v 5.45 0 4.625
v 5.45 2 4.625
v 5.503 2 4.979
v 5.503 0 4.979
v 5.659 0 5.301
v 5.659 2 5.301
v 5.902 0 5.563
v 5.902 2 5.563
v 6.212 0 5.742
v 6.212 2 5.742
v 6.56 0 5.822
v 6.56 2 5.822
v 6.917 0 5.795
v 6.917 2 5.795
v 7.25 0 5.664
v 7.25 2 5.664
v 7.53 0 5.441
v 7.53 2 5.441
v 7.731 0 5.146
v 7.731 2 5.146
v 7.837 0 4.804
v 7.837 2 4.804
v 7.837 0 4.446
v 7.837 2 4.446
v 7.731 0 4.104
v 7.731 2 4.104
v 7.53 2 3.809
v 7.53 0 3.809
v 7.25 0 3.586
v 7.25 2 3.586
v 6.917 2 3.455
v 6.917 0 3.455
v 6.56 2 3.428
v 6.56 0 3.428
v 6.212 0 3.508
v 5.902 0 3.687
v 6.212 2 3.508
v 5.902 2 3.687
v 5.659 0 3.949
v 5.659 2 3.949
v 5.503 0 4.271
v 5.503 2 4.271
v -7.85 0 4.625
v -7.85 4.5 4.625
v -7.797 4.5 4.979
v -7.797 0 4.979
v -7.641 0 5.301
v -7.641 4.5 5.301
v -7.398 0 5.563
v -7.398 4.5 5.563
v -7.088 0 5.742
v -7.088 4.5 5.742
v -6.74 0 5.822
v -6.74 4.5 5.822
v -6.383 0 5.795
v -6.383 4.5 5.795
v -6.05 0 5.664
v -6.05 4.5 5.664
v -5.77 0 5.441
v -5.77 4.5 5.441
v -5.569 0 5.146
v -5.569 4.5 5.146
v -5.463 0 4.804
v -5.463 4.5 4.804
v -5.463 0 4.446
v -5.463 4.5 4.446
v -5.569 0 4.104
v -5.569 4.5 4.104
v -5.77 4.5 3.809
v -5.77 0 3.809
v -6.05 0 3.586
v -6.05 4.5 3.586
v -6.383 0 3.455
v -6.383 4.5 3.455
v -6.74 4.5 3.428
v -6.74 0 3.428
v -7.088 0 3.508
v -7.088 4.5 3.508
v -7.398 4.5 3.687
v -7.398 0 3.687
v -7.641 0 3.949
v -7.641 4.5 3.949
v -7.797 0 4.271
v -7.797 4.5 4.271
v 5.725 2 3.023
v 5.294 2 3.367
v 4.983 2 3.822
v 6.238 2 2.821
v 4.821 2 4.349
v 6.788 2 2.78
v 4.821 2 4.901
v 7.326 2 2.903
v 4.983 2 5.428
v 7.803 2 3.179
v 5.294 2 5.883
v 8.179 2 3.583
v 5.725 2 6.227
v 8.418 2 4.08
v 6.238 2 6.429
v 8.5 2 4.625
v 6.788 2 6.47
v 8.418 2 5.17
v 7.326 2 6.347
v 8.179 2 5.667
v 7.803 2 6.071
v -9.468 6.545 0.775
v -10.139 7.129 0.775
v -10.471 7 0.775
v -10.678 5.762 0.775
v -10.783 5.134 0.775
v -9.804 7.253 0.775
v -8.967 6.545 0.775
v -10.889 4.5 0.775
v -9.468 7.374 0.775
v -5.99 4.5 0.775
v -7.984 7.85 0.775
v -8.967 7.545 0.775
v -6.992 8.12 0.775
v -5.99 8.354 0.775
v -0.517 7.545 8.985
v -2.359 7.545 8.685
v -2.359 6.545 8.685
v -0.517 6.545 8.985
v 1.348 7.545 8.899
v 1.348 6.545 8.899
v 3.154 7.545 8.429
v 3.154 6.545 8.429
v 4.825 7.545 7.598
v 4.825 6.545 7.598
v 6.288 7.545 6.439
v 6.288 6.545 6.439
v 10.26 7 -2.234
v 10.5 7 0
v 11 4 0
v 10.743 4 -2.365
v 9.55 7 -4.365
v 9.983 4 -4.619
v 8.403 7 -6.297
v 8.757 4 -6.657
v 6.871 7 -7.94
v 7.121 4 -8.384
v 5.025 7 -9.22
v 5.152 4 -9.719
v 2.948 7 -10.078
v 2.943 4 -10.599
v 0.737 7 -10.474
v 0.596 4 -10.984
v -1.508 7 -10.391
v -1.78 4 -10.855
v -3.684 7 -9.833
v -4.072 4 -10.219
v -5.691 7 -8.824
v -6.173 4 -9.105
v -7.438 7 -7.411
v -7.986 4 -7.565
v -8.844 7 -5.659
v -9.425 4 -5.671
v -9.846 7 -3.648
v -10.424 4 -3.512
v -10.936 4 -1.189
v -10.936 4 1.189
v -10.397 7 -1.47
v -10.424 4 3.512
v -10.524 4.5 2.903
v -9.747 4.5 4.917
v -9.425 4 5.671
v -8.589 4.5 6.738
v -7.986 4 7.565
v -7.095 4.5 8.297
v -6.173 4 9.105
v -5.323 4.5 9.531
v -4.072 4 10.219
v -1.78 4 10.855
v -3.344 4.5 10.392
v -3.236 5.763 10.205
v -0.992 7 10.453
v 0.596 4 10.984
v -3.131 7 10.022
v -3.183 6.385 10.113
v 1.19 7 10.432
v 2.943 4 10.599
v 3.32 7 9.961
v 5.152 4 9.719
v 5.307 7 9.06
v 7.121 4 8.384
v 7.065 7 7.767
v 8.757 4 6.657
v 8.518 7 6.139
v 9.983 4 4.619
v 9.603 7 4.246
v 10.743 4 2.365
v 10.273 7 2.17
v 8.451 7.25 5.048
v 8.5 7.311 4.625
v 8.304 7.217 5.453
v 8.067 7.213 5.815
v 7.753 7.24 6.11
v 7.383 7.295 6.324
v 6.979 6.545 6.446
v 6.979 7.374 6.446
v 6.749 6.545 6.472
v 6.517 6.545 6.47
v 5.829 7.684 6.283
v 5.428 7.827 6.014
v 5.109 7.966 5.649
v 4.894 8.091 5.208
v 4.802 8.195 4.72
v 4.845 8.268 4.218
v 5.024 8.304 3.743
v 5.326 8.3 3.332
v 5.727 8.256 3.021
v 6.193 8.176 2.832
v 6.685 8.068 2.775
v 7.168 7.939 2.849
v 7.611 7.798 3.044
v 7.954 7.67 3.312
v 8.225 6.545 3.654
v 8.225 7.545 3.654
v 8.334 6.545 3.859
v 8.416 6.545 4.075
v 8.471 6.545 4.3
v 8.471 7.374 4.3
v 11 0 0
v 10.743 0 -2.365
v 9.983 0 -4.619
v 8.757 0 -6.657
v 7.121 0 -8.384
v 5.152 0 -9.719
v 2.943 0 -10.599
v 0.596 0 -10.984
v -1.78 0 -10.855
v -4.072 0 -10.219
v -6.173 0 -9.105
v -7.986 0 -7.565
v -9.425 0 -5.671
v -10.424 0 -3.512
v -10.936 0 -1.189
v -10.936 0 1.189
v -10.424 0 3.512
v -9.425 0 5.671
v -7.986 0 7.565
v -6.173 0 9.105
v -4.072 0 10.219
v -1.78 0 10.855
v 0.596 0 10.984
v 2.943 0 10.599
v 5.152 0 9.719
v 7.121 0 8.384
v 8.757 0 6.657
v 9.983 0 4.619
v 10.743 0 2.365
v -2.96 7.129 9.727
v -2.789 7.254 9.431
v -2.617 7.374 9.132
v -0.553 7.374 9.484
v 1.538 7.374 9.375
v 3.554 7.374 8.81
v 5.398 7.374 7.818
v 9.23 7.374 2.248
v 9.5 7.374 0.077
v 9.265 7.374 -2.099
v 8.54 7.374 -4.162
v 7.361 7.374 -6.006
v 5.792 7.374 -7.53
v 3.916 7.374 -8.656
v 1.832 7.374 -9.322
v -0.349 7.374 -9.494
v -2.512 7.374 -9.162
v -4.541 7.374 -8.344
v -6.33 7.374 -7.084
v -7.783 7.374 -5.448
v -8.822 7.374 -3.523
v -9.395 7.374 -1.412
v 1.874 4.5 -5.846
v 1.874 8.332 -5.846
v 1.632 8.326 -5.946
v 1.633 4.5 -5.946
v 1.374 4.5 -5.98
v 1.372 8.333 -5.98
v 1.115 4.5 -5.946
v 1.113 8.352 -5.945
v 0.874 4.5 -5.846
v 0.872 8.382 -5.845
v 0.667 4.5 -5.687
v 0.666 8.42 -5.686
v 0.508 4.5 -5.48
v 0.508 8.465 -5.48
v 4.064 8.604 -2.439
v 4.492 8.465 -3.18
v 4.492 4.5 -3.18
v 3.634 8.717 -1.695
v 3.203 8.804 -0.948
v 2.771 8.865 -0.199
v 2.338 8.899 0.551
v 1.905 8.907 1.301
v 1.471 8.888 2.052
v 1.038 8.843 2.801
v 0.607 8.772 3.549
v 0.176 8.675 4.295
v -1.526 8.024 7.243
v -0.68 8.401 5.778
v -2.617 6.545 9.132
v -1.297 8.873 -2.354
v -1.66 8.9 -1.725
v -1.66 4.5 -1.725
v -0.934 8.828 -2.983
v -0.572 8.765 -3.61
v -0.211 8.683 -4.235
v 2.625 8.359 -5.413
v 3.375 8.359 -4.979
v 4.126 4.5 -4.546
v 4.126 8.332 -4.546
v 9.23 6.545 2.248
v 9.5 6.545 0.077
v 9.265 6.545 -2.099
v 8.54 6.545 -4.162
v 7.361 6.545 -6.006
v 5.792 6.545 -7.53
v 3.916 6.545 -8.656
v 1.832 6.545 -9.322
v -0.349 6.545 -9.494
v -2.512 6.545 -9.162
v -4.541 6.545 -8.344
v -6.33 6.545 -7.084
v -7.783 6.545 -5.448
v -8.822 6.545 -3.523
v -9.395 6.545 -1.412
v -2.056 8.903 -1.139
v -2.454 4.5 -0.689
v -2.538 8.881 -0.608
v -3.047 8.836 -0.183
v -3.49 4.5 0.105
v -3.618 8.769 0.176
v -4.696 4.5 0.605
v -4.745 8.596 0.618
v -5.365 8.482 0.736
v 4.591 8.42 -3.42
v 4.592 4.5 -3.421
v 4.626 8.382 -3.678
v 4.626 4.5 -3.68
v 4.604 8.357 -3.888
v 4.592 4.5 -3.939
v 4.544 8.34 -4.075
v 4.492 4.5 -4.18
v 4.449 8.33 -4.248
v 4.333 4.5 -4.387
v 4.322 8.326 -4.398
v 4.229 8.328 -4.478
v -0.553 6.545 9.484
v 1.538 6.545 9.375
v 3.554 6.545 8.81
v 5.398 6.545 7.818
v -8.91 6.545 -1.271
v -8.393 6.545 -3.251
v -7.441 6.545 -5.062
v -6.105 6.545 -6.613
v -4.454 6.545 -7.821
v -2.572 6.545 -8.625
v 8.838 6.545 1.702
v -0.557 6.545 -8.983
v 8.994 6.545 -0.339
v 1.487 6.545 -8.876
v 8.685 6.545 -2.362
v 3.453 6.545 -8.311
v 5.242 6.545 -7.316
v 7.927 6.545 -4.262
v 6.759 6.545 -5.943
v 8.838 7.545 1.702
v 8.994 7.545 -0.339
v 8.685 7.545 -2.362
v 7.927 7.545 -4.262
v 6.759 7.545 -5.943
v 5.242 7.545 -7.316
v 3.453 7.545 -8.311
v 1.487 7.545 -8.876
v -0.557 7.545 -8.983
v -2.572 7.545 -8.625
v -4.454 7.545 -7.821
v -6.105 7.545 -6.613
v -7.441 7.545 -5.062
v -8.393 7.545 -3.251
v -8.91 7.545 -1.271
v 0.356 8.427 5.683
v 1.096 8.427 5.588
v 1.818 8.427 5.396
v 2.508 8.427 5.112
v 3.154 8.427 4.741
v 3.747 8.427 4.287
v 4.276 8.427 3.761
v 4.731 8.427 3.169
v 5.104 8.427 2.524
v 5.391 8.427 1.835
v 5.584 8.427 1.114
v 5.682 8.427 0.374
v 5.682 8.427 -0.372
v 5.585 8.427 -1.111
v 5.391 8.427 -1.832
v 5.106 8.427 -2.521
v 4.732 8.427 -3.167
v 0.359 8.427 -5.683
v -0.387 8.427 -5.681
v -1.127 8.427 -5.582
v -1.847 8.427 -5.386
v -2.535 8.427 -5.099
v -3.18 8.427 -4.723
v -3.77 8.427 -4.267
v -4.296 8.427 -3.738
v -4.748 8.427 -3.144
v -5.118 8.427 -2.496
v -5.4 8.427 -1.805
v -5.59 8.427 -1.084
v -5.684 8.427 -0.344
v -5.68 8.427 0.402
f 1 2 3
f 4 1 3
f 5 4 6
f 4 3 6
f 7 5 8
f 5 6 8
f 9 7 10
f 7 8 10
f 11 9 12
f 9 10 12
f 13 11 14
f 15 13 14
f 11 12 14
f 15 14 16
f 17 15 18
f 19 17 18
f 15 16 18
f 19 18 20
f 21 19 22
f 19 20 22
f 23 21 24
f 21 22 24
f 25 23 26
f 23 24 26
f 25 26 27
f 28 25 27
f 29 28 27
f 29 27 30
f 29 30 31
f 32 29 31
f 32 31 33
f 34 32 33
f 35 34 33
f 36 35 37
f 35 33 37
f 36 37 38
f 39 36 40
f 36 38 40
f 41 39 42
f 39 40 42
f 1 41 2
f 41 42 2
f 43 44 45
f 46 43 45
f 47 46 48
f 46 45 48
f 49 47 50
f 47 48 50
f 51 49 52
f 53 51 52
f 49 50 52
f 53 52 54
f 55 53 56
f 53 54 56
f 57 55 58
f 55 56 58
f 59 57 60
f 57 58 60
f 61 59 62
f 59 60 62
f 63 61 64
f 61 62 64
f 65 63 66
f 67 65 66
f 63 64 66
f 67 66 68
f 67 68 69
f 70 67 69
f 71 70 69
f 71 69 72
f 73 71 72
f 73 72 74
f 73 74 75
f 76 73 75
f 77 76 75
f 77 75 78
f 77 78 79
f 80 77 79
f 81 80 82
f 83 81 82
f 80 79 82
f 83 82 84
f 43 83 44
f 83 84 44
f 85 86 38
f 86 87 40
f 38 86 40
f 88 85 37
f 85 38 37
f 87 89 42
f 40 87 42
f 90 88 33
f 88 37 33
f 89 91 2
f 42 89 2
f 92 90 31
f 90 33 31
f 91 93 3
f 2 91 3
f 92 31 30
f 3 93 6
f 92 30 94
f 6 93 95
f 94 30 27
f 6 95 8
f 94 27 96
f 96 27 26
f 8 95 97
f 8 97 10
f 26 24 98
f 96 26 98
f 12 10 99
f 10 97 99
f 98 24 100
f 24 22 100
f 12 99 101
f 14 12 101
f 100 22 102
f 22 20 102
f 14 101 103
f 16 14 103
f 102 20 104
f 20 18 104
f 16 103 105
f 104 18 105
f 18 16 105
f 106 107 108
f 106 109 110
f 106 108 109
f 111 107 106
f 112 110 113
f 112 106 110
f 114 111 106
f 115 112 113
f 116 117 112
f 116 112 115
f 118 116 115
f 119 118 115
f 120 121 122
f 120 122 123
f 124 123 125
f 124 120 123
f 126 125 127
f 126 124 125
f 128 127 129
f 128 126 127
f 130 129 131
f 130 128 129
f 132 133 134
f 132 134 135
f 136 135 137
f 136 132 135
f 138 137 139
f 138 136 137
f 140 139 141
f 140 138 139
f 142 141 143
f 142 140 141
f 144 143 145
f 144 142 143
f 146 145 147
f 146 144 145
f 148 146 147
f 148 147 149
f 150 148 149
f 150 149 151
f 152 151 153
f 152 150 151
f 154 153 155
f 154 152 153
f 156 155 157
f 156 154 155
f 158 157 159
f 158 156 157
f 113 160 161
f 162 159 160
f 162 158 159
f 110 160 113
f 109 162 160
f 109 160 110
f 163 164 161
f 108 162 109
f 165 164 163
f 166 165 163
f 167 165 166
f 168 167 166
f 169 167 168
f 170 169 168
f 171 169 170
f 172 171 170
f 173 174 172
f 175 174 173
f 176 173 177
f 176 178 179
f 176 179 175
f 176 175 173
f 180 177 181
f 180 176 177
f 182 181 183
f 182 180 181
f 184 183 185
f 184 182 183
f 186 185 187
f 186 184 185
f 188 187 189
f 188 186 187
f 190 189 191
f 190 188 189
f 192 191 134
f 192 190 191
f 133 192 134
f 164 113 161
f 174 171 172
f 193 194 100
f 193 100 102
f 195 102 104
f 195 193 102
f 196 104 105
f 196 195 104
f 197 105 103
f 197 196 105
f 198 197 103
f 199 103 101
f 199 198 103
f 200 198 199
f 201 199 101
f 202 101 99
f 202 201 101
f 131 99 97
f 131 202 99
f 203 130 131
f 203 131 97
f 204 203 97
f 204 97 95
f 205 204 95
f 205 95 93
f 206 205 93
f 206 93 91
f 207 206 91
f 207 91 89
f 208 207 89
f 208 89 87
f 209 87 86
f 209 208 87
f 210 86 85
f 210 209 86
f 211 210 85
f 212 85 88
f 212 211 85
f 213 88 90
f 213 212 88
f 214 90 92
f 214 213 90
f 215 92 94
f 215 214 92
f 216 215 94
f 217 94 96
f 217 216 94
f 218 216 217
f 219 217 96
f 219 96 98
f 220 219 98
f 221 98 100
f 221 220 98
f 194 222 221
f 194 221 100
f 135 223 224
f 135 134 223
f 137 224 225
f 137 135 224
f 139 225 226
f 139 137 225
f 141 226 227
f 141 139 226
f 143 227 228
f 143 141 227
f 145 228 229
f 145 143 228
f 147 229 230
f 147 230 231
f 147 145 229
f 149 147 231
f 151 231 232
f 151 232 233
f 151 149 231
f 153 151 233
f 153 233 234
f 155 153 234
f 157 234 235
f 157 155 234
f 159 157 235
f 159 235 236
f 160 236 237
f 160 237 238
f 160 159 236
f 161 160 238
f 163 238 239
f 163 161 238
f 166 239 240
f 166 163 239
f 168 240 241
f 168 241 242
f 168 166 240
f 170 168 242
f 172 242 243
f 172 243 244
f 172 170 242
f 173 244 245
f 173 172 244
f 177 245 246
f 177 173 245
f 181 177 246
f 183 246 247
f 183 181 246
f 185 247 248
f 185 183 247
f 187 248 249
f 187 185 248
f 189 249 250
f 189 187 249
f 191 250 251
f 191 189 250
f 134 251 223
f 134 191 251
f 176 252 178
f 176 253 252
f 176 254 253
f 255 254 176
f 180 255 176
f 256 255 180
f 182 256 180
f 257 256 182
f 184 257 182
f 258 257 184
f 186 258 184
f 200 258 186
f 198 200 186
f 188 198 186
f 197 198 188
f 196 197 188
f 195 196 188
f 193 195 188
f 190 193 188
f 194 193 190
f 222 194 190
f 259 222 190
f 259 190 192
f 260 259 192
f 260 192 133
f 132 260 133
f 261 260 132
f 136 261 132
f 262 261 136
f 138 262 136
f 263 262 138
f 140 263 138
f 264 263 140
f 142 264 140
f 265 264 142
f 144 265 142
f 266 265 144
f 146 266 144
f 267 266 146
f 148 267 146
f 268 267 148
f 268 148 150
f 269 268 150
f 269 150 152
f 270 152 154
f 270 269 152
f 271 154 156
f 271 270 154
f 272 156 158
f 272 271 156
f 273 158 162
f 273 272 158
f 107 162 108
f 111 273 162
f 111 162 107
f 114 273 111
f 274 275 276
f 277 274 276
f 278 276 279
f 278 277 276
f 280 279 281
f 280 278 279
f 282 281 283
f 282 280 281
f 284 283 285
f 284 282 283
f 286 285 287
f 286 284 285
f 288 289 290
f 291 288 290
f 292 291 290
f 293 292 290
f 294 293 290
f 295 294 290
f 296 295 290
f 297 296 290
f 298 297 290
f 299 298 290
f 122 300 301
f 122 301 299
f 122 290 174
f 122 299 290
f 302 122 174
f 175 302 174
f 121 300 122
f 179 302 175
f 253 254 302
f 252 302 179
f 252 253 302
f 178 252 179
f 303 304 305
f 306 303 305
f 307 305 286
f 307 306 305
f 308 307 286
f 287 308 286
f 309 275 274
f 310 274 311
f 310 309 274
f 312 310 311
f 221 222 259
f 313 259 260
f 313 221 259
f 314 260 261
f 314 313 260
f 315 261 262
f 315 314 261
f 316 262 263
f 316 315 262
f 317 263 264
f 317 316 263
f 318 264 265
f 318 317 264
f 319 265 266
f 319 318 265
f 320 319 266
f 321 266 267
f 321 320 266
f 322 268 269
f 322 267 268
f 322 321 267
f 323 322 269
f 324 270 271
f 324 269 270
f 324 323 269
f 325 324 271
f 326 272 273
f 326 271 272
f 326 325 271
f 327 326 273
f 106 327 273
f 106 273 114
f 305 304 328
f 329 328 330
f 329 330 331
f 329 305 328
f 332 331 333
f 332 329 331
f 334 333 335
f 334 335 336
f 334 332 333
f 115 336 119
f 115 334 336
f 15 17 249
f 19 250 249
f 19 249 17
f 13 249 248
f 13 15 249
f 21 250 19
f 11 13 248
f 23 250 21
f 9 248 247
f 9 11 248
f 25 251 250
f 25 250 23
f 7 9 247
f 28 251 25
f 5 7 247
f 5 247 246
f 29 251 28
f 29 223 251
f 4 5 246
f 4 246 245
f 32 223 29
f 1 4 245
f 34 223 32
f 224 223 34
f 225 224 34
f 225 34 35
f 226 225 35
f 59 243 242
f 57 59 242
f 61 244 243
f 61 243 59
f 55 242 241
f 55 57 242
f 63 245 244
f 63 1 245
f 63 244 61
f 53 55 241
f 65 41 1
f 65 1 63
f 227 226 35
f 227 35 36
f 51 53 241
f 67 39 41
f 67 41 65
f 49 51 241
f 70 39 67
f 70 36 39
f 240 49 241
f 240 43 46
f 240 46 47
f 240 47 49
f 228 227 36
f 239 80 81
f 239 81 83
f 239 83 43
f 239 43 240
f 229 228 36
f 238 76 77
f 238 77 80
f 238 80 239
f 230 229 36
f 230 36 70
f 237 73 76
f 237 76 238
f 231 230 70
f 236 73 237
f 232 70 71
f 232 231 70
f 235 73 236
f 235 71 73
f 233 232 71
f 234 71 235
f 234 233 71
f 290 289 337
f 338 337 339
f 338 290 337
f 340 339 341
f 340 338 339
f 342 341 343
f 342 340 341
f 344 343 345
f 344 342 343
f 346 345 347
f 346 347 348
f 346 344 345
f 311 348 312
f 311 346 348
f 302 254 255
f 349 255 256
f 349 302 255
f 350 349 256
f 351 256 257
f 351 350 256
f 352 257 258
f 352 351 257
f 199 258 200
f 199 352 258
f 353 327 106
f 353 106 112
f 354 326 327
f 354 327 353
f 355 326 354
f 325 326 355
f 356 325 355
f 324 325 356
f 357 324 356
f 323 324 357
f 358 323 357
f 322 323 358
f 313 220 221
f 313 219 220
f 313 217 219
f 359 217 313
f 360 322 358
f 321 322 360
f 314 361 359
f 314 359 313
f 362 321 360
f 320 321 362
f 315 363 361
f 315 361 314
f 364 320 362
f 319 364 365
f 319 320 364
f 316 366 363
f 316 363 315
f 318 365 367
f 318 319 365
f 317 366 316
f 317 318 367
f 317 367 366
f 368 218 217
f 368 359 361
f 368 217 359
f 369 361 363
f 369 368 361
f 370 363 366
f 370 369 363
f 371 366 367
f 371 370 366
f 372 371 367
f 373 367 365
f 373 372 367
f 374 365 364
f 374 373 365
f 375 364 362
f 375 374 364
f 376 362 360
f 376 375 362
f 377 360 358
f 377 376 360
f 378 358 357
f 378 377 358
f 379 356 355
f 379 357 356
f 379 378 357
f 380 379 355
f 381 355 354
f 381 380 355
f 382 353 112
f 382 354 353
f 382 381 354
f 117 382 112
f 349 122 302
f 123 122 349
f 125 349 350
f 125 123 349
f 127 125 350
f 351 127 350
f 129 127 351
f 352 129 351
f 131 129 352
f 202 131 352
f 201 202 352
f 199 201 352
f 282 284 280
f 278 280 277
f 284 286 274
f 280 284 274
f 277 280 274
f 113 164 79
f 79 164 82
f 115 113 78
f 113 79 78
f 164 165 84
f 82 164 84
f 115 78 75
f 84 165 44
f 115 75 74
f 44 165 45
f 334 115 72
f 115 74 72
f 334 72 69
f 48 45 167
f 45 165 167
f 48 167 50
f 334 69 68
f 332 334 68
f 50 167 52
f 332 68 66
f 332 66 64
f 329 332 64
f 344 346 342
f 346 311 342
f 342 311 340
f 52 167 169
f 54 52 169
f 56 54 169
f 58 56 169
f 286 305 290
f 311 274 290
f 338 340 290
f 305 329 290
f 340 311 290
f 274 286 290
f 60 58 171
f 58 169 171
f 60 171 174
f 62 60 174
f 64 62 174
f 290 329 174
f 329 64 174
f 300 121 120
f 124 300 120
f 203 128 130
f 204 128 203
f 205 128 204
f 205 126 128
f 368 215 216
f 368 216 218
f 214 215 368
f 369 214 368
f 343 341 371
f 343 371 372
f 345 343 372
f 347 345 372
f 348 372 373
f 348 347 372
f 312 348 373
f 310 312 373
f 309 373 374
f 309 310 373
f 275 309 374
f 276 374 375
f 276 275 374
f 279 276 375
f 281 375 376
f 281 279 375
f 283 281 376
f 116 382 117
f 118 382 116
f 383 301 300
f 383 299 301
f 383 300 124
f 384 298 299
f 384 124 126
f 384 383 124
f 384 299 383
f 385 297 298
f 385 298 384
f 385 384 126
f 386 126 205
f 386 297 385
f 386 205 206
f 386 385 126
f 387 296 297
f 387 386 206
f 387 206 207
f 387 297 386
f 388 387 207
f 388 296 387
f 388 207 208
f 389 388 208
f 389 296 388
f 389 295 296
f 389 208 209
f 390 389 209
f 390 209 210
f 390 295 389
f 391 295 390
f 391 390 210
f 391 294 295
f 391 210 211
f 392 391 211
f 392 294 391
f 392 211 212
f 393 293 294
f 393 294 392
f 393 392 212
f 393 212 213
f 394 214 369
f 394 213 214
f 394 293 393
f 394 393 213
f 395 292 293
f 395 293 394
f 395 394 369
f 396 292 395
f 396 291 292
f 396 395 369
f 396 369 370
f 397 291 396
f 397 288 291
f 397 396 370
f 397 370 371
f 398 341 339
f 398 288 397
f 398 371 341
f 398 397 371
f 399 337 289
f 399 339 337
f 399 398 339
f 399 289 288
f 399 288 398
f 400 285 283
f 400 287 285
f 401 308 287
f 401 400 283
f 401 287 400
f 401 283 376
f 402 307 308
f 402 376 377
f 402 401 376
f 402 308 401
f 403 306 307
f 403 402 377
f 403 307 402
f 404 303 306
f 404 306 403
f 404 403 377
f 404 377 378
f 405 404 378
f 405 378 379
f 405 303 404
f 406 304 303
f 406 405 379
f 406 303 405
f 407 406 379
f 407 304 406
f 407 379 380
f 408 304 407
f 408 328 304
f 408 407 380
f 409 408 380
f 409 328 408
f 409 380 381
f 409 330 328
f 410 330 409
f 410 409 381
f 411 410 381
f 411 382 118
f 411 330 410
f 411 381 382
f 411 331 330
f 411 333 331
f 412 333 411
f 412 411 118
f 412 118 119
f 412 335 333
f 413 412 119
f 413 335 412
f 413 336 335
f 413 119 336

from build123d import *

# Parameters (mm, degrees)
F3_R      = 1.85
F4_DEPTH  = 7
F5_R      = 1.2
F6_DEPTH  = 2
F8_DEPTH  = 4.5
F9_R      = 1
F10_R     = 1.2
F11_DEPTH = 4.5
F12_R     = 5


with BuildPart() as f1:
    # F0 (on Top) → F1 (revolve)
    with BuildSketch(Plane.XY):
        with BuildLine():
            Line((0, 9), (0, 0))
            Line((0, 0), (11, 0))
            Line((11, 0), (11, 4))
            Line((11, 4), (10.5, 7))
            ThreePointArc((10.5, 7), (10.0017468007, 7.1915925315), (9.5, 7.3738398822))
            Line((9.5, 7.3738398822), (9.5, 6.5449972332))
            Line((9.5, 6.5449972332), (9, 6.5449972332))
            Line((9, 6.5449972332), (9, 7.5449972332))
            ThreePointArc((9, 7.5449972332), (4.5584271698, 8.6339031037), (0, 9))
        make_face()
    revolve(axis=Axis((0, 4.5, 0), (0, 1, 0)))

    # F3 (on offset) → F4 (cut)
    with BuildSketch(Plane.XZ.offset(-9)):
        with Locations((6.65, 4.625)):
            Circle(F3_R)
    extrude(amount=F4_DEPTH, mode=Mode.SUBTRACT)

    # F5 (on face) → F6 (cut, through all)
    with BuildSketch(Plane(origin=(0, 2, 0), x_dir=(-1, 0, 0), z_dir=(0, 1, 0))):
        with Locations((-6.65, 4.625)):
            Circle(F5_R)
    extrude(amount=-F6_DEPTH, mode=Mode.SUBTRACT)

    # F7 (on offset) → F8 (cut)
    with BuildSketch(Plane.XZ.offset(-9)):
        with BuildLine():
            Line((4.9918584287, -4.0461524227), (-3.38657071, 10.4657125331))
            ThreePointArc((-3.38657071, 10.4657125331), (-8.661662033, 6.780531751), (-10.9726648996, 0.775))
            Line((-10.9726648996, 0.775), (-3.1032576969, 0.775))
            Line((-3.1032576969, 0.775), (1.0081415713, -6.3461524227))
            Line((1.0081415713, -6.3461524227), (4.9918584287, -4.0461524227))
        make_face()
    extrude(amount=F8_DEPTH, mode=Mode.SUBTRACT)

    # F9
    f9_edges = [f1.edges().sort_by_distance(p)[0] for p in [
        (4.991858, 6.383907, -4.046152),
        (1.008142, 6.383907, -6.346152),
    ]]
    fillet(f9_edges, radius=F9_R)

    # F10 (on face) → F11 (cut, through all)
    with BuildSketch(Plane(origin=(0, 4.5, 0), x_dir=(-1, 0, 0), z_dir=(0, 1, 0))):
        with Locations((6.65, 4.625)):
            Circle(F10_R)
    extrude(amount=-F11_DEPTH, mode=Mode.SUBTRACT)

    # F12
    f12_edges = [f1.edges().sort_by_distance(p)[0] for p in [
        (-3.103258, 6.66017, 0.775),
    ]]
    fillet(f12_edges, radius=F12_R)


solid = f1.part
